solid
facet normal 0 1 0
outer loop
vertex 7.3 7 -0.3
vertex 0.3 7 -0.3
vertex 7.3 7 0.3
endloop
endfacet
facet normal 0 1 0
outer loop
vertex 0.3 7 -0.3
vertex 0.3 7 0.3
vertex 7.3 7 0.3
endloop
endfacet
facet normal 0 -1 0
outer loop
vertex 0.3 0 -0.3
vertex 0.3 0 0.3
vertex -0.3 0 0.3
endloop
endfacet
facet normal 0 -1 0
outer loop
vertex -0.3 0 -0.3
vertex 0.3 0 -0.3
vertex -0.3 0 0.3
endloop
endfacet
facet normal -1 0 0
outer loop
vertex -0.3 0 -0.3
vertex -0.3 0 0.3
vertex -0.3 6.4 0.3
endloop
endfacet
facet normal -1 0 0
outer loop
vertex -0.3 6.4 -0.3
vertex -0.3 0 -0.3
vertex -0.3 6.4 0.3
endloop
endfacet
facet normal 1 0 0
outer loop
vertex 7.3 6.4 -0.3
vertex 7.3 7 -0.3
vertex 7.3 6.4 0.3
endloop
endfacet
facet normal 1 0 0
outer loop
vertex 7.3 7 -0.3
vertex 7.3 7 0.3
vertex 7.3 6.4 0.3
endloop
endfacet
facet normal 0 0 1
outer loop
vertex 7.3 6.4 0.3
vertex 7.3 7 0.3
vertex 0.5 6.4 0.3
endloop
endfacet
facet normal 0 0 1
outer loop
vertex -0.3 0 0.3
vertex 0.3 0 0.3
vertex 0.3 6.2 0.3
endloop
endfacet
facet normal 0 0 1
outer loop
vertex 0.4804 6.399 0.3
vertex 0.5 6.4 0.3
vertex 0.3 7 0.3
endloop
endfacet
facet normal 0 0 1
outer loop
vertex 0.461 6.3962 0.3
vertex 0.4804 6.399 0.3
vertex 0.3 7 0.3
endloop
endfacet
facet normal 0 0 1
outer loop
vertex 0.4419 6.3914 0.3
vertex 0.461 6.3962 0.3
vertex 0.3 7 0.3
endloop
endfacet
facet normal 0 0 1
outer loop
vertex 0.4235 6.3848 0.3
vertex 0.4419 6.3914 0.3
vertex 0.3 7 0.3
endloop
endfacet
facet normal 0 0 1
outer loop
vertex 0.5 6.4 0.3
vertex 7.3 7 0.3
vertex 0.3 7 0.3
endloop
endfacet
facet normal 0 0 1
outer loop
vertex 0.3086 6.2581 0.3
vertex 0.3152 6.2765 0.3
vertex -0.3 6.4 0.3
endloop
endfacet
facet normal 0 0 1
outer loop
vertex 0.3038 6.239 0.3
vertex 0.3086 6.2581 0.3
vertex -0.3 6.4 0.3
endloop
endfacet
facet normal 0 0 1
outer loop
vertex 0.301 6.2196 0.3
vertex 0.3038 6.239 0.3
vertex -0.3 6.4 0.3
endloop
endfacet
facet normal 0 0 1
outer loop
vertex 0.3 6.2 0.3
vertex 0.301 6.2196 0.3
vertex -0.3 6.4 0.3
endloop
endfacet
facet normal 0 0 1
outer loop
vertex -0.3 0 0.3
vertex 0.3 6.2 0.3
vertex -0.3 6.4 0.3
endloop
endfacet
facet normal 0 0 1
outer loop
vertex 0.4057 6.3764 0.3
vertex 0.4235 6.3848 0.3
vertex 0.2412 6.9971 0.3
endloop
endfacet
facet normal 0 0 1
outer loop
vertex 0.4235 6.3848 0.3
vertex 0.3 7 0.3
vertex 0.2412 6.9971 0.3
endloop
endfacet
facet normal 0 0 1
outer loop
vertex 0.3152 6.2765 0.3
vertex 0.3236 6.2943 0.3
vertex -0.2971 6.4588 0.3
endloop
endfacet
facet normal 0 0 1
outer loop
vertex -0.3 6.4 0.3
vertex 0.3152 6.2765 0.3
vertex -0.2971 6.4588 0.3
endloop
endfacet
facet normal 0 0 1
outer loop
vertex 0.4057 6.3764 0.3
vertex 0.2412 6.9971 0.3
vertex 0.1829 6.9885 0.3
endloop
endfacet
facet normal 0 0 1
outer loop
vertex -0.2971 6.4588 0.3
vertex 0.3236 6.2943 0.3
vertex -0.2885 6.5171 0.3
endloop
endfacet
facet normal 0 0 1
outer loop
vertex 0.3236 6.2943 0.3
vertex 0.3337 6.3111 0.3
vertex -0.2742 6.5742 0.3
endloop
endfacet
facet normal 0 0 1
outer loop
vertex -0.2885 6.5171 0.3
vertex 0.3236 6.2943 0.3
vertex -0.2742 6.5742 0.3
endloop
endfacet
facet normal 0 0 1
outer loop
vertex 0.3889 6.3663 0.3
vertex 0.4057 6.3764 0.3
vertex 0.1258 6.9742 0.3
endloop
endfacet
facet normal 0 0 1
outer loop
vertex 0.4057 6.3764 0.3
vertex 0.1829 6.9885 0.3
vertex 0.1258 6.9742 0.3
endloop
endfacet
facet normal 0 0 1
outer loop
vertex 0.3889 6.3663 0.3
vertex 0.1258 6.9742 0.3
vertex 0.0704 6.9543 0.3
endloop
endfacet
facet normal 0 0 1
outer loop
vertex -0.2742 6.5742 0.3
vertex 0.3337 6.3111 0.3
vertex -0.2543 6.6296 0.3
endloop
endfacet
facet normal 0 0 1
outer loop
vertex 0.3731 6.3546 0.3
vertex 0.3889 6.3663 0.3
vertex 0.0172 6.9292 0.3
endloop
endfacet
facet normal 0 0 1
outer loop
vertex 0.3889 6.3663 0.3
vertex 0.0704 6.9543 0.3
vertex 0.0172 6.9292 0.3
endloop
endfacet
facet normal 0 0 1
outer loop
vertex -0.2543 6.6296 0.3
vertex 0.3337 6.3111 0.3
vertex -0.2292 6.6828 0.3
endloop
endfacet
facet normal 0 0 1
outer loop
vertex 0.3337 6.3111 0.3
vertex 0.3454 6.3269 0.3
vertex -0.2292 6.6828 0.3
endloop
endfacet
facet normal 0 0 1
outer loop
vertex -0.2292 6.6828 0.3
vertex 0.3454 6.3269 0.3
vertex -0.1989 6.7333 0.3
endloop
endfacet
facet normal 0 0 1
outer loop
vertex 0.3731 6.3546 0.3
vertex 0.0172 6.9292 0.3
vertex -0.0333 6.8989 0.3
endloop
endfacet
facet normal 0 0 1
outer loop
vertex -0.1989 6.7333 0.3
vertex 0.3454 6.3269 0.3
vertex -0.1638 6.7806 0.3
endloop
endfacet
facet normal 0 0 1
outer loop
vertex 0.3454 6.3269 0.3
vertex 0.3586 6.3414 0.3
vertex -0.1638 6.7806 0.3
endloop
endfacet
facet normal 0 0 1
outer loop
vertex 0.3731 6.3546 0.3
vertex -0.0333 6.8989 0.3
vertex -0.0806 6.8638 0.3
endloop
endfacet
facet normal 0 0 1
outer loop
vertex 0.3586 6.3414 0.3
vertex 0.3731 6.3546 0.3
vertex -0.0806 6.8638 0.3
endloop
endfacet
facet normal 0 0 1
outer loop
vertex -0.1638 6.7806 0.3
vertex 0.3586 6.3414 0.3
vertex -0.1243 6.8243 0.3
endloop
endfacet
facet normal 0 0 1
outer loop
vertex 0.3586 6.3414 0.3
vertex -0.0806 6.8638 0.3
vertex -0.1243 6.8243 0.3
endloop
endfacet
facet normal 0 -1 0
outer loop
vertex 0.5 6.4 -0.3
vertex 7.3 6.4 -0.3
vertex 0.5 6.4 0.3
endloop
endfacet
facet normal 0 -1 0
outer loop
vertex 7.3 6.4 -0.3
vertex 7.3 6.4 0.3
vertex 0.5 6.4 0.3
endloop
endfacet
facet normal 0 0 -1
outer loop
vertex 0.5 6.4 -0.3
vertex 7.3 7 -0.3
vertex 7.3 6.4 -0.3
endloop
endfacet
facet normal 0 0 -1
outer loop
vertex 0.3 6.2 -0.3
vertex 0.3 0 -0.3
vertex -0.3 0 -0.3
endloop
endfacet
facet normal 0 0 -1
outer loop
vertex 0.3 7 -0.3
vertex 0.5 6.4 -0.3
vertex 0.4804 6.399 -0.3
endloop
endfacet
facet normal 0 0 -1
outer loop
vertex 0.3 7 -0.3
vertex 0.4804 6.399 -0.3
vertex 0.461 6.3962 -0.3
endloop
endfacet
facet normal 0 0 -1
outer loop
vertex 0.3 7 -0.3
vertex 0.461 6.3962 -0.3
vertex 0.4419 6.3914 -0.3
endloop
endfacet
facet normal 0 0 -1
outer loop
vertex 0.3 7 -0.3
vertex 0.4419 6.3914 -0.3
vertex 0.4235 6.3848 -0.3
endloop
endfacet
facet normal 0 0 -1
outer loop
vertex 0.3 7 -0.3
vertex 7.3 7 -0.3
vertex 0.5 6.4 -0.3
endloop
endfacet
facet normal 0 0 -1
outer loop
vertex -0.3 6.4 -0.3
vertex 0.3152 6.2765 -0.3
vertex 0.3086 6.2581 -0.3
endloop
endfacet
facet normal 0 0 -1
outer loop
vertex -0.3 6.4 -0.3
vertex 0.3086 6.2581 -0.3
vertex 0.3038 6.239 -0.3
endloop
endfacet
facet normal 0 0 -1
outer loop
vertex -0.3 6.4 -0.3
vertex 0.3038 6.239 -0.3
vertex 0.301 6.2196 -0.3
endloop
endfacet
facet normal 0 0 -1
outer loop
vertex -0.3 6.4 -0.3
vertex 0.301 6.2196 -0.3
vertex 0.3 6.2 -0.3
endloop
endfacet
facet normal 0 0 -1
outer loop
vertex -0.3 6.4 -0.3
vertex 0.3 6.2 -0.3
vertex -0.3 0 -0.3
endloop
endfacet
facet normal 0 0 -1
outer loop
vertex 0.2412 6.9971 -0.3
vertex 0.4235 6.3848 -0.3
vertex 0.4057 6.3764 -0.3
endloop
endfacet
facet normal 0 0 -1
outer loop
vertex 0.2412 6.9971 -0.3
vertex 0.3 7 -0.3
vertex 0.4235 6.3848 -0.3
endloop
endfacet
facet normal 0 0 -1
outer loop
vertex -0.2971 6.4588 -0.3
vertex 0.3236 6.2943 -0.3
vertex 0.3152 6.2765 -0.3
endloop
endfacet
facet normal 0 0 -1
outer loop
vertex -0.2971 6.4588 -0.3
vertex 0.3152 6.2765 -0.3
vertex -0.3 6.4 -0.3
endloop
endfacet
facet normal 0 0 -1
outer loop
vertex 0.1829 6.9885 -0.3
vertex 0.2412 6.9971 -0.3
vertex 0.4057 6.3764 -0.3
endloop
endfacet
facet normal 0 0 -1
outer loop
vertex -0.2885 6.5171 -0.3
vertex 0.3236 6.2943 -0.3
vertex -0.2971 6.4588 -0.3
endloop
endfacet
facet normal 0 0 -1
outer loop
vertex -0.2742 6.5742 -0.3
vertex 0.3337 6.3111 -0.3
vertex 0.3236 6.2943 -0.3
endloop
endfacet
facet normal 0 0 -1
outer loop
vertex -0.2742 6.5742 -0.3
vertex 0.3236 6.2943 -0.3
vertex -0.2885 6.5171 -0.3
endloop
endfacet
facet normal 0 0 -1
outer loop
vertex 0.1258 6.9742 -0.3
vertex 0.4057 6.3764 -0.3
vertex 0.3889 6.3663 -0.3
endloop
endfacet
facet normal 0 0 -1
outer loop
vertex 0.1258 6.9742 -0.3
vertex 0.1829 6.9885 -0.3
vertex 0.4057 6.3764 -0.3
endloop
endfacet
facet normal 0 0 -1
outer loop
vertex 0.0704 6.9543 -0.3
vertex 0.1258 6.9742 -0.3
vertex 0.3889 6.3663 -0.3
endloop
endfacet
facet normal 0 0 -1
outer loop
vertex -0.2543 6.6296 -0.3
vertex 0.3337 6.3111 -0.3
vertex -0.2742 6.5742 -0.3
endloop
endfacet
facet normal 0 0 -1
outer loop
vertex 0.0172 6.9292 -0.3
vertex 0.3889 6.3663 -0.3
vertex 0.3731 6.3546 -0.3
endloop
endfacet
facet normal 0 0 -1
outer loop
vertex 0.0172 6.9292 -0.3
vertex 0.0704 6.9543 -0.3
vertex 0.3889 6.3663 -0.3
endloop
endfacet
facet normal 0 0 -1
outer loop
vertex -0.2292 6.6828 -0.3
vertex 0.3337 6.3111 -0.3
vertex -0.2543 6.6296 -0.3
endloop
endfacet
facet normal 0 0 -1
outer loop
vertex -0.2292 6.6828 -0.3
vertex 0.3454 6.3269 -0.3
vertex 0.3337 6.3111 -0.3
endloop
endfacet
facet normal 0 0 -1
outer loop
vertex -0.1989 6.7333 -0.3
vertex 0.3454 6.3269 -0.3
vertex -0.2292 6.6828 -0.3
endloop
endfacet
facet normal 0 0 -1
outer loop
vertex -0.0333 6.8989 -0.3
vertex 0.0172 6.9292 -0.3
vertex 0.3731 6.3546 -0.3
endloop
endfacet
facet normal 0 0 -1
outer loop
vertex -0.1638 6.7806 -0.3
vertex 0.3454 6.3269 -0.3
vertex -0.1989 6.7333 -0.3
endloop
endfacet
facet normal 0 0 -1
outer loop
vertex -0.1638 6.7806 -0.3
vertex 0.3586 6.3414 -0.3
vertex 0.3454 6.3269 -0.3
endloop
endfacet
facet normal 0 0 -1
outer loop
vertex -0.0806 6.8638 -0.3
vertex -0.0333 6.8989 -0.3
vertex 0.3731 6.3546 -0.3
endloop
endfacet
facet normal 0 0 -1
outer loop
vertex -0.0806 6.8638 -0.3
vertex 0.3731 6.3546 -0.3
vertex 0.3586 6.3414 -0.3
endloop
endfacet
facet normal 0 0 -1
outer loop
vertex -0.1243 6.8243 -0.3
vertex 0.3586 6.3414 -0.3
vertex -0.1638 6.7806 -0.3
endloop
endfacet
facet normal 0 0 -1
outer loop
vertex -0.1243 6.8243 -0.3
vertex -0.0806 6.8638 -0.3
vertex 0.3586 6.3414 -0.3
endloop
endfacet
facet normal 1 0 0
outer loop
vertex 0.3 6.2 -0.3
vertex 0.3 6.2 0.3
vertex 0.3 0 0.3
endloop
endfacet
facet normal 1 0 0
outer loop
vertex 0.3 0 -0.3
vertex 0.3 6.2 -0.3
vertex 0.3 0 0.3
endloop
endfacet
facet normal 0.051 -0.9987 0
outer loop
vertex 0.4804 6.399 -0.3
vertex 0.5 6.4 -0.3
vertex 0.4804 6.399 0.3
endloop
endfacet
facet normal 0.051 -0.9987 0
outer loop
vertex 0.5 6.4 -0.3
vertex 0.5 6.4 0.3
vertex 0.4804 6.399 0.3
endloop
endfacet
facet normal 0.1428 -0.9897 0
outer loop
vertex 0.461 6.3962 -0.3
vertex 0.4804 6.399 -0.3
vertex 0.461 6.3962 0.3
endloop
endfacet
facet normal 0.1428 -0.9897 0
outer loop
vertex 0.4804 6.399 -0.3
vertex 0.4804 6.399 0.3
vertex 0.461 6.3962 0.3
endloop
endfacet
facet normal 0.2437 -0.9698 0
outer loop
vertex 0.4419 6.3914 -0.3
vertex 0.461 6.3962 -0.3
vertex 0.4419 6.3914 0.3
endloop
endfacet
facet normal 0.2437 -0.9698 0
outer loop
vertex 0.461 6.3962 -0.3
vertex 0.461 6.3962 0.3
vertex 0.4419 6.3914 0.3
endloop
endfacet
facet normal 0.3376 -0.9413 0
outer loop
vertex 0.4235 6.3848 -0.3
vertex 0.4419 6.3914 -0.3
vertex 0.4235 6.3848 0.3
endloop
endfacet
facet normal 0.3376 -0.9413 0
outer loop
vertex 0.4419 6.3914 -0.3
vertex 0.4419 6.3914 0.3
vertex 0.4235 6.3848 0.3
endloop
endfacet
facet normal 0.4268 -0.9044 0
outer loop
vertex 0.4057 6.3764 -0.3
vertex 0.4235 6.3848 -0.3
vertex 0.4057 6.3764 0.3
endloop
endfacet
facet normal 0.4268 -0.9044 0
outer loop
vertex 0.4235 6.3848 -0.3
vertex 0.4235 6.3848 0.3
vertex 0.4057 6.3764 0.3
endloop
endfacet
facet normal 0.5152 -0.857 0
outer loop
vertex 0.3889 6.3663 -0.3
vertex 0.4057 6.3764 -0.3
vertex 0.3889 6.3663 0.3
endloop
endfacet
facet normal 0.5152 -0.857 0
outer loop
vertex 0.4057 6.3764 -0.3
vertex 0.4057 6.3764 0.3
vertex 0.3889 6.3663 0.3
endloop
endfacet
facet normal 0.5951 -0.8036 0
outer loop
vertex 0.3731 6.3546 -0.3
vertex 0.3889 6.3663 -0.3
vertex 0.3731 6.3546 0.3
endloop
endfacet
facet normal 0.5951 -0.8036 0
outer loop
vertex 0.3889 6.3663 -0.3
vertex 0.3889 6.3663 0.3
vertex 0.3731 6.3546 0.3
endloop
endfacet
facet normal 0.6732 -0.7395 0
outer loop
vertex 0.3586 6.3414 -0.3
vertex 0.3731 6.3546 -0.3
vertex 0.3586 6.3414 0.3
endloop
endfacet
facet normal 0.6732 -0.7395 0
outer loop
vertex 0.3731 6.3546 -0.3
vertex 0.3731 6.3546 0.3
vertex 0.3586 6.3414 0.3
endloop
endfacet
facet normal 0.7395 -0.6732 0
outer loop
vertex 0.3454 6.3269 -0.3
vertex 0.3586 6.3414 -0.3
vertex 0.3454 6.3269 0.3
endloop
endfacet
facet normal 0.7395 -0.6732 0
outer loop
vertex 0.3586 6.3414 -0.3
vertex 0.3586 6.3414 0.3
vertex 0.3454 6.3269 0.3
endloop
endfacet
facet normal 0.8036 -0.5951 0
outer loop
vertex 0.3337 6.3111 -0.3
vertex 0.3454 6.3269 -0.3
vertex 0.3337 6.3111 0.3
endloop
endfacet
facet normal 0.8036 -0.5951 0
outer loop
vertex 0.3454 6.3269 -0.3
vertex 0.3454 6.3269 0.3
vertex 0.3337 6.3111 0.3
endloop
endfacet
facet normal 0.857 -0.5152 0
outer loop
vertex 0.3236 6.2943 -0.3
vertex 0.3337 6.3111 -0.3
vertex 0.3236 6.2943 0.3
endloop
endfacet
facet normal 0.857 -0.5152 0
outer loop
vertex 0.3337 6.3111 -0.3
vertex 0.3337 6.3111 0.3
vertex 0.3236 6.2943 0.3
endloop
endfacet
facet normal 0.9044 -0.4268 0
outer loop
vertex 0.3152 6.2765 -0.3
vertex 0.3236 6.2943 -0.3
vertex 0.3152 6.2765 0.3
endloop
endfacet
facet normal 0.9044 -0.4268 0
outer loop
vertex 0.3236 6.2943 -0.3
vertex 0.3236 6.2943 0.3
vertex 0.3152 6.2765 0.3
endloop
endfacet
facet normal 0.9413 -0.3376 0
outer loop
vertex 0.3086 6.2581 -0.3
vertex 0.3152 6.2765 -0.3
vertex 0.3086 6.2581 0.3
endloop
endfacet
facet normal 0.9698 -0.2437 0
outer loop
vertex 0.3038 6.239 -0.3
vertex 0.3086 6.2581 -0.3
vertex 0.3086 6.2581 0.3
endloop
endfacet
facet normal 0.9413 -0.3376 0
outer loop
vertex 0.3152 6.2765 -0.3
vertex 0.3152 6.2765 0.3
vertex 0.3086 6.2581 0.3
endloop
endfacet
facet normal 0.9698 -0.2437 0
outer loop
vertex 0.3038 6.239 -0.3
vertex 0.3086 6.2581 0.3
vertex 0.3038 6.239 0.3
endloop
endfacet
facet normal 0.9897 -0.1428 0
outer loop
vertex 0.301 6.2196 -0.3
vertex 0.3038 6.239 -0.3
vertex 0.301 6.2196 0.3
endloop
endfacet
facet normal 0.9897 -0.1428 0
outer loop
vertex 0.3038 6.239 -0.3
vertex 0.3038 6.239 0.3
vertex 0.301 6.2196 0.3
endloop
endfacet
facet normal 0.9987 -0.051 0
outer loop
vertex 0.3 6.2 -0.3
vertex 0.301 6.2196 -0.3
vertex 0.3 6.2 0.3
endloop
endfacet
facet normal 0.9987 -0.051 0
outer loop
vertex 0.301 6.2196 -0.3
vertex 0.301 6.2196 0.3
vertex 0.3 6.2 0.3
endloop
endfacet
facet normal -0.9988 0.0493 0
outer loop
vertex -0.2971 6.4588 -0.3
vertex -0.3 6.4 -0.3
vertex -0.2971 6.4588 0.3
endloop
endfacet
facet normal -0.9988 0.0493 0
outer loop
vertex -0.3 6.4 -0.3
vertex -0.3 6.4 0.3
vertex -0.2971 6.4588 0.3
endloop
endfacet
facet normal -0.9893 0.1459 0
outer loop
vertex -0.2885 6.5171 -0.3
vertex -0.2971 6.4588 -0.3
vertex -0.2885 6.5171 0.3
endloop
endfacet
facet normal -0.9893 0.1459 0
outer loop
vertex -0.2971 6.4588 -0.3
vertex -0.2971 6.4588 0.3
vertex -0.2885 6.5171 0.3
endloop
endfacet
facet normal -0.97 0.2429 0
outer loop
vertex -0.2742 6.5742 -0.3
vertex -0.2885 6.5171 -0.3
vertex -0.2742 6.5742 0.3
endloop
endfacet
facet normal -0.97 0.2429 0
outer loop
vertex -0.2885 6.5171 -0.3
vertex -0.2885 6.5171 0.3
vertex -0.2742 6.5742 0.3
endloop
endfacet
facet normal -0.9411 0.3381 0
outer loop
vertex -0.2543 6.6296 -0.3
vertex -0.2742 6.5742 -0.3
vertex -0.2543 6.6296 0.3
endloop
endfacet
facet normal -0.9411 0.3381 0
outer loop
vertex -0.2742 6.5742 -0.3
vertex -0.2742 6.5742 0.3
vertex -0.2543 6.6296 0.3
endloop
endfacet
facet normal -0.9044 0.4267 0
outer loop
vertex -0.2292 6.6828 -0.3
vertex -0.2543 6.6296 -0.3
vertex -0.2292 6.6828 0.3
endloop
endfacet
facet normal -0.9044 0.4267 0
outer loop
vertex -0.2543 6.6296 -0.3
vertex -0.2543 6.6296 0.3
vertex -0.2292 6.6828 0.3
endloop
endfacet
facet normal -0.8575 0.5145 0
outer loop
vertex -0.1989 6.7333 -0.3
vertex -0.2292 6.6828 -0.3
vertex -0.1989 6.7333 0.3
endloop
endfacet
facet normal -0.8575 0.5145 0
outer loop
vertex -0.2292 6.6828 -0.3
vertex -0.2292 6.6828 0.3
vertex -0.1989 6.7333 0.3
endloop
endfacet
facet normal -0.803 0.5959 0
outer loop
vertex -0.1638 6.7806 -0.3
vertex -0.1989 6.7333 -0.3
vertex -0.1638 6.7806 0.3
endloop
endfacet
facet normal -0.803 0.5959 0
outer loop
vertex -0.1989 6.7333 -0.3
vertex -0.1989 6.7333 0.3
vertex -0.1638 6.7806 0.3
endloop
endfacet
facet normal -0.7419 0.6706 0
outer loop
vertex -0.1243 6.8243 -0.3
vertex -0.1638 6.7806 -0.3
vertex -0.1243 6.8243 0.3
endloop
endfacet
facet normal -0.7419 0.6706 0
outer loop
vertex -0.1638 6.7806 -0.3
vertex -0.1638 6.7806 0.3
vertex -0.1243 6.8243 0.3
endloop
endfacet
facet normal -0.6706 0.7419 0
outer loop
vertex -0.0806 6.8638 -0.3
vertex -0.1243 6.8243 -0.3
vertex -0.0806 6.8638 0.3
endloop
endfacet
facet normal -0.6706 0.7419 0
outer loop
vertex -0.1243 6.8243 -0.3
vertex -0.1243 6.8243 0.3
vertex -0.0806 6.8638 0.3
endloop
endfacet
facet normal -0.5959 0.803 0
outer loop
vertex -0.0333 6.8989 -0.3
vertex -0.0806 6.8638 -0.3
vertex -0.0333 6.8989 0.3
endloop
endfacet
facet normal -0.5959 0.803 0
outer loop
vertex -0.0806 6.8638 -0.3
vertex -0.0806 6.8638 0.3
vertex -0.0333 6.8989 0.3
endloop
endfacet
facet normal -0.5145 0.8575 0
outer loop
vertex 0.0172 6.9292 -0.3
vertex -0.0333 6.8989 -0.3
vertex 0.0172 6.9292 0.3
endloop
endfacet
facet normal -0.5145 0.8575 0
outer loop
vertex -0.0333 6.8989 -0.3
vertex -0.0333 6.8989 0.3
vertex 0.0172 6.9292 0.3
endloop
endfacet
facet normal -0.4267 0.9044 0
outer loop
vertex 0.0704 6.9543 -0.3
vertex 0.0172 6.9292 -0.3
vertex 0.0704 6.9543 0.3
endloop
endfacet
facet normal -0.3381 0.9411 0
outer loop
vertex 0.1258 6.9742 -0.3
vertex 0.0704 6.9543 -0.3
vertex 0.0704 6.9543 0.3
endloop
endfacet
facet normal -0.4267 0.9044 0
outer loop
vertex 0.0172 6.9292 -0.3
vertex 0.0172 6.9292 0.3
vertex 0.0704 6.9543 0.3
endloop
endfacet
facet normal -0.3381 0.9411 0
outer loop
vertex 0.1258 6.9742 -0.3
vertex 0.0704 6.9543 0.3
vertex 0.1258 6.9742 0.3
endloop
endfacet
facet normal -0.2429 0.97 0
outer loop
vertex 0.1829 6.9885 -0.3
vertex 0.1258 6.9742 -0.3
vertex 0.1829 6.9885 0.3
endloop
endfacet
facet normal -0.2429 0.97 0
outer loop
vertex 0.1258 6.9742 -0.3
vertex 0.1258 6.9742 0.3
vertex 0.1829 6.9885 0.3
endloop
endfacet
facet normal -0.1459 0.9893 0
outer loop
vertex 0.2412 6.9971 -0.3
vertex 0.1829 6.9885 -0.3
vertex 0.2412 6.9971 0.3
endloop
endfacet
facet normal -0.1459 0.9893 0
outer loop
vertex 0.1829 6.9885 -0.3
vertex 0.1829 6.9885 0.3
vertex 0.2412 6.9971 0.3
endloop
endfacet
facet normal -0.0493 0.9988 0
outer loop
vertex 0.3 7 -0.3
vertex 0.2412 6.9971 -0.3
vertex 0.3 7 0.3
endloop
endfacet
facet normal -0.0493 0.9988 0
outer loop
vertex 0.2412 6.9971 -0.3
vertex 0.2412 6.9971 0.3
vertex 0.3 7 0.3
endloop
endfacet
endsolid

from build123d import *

# Parameters (mm, degrees)
BOSS_EXTRUDE1_DEPTH = 0.3


with BuildPart() as part:
    # Sketch3 → Boss-Extrude1 (new body, symmetric)
    with BuildSketch(Plane.XY):
        with BuildLine():
            Line((0, 0), (-0.3, 0))
            Line((-0.3, 0), (-0.3, 6.4))
            ThreePointArc((-0.3, 6.4), (-0.124264069, 6.824264069), (0.3, 7))
            Line((0.3, 7), (7.3, 7))
            Line((7.3, 7), (7.3, 6.4))
            Line((7.3, 6.4), (0.5, 6.4))
            ThreePointArc((0.5, 6.4), (0.358578644, 6.341421356), (0.3, 6.2))
            Line((0.3, 6.2), (0.3, 0))
            Line((0.3, 0), (0, 0))
        make_face()
    extrude(amount=BOSS_EXTRUDE1_DEPTH, both=True)


solid = part.part
